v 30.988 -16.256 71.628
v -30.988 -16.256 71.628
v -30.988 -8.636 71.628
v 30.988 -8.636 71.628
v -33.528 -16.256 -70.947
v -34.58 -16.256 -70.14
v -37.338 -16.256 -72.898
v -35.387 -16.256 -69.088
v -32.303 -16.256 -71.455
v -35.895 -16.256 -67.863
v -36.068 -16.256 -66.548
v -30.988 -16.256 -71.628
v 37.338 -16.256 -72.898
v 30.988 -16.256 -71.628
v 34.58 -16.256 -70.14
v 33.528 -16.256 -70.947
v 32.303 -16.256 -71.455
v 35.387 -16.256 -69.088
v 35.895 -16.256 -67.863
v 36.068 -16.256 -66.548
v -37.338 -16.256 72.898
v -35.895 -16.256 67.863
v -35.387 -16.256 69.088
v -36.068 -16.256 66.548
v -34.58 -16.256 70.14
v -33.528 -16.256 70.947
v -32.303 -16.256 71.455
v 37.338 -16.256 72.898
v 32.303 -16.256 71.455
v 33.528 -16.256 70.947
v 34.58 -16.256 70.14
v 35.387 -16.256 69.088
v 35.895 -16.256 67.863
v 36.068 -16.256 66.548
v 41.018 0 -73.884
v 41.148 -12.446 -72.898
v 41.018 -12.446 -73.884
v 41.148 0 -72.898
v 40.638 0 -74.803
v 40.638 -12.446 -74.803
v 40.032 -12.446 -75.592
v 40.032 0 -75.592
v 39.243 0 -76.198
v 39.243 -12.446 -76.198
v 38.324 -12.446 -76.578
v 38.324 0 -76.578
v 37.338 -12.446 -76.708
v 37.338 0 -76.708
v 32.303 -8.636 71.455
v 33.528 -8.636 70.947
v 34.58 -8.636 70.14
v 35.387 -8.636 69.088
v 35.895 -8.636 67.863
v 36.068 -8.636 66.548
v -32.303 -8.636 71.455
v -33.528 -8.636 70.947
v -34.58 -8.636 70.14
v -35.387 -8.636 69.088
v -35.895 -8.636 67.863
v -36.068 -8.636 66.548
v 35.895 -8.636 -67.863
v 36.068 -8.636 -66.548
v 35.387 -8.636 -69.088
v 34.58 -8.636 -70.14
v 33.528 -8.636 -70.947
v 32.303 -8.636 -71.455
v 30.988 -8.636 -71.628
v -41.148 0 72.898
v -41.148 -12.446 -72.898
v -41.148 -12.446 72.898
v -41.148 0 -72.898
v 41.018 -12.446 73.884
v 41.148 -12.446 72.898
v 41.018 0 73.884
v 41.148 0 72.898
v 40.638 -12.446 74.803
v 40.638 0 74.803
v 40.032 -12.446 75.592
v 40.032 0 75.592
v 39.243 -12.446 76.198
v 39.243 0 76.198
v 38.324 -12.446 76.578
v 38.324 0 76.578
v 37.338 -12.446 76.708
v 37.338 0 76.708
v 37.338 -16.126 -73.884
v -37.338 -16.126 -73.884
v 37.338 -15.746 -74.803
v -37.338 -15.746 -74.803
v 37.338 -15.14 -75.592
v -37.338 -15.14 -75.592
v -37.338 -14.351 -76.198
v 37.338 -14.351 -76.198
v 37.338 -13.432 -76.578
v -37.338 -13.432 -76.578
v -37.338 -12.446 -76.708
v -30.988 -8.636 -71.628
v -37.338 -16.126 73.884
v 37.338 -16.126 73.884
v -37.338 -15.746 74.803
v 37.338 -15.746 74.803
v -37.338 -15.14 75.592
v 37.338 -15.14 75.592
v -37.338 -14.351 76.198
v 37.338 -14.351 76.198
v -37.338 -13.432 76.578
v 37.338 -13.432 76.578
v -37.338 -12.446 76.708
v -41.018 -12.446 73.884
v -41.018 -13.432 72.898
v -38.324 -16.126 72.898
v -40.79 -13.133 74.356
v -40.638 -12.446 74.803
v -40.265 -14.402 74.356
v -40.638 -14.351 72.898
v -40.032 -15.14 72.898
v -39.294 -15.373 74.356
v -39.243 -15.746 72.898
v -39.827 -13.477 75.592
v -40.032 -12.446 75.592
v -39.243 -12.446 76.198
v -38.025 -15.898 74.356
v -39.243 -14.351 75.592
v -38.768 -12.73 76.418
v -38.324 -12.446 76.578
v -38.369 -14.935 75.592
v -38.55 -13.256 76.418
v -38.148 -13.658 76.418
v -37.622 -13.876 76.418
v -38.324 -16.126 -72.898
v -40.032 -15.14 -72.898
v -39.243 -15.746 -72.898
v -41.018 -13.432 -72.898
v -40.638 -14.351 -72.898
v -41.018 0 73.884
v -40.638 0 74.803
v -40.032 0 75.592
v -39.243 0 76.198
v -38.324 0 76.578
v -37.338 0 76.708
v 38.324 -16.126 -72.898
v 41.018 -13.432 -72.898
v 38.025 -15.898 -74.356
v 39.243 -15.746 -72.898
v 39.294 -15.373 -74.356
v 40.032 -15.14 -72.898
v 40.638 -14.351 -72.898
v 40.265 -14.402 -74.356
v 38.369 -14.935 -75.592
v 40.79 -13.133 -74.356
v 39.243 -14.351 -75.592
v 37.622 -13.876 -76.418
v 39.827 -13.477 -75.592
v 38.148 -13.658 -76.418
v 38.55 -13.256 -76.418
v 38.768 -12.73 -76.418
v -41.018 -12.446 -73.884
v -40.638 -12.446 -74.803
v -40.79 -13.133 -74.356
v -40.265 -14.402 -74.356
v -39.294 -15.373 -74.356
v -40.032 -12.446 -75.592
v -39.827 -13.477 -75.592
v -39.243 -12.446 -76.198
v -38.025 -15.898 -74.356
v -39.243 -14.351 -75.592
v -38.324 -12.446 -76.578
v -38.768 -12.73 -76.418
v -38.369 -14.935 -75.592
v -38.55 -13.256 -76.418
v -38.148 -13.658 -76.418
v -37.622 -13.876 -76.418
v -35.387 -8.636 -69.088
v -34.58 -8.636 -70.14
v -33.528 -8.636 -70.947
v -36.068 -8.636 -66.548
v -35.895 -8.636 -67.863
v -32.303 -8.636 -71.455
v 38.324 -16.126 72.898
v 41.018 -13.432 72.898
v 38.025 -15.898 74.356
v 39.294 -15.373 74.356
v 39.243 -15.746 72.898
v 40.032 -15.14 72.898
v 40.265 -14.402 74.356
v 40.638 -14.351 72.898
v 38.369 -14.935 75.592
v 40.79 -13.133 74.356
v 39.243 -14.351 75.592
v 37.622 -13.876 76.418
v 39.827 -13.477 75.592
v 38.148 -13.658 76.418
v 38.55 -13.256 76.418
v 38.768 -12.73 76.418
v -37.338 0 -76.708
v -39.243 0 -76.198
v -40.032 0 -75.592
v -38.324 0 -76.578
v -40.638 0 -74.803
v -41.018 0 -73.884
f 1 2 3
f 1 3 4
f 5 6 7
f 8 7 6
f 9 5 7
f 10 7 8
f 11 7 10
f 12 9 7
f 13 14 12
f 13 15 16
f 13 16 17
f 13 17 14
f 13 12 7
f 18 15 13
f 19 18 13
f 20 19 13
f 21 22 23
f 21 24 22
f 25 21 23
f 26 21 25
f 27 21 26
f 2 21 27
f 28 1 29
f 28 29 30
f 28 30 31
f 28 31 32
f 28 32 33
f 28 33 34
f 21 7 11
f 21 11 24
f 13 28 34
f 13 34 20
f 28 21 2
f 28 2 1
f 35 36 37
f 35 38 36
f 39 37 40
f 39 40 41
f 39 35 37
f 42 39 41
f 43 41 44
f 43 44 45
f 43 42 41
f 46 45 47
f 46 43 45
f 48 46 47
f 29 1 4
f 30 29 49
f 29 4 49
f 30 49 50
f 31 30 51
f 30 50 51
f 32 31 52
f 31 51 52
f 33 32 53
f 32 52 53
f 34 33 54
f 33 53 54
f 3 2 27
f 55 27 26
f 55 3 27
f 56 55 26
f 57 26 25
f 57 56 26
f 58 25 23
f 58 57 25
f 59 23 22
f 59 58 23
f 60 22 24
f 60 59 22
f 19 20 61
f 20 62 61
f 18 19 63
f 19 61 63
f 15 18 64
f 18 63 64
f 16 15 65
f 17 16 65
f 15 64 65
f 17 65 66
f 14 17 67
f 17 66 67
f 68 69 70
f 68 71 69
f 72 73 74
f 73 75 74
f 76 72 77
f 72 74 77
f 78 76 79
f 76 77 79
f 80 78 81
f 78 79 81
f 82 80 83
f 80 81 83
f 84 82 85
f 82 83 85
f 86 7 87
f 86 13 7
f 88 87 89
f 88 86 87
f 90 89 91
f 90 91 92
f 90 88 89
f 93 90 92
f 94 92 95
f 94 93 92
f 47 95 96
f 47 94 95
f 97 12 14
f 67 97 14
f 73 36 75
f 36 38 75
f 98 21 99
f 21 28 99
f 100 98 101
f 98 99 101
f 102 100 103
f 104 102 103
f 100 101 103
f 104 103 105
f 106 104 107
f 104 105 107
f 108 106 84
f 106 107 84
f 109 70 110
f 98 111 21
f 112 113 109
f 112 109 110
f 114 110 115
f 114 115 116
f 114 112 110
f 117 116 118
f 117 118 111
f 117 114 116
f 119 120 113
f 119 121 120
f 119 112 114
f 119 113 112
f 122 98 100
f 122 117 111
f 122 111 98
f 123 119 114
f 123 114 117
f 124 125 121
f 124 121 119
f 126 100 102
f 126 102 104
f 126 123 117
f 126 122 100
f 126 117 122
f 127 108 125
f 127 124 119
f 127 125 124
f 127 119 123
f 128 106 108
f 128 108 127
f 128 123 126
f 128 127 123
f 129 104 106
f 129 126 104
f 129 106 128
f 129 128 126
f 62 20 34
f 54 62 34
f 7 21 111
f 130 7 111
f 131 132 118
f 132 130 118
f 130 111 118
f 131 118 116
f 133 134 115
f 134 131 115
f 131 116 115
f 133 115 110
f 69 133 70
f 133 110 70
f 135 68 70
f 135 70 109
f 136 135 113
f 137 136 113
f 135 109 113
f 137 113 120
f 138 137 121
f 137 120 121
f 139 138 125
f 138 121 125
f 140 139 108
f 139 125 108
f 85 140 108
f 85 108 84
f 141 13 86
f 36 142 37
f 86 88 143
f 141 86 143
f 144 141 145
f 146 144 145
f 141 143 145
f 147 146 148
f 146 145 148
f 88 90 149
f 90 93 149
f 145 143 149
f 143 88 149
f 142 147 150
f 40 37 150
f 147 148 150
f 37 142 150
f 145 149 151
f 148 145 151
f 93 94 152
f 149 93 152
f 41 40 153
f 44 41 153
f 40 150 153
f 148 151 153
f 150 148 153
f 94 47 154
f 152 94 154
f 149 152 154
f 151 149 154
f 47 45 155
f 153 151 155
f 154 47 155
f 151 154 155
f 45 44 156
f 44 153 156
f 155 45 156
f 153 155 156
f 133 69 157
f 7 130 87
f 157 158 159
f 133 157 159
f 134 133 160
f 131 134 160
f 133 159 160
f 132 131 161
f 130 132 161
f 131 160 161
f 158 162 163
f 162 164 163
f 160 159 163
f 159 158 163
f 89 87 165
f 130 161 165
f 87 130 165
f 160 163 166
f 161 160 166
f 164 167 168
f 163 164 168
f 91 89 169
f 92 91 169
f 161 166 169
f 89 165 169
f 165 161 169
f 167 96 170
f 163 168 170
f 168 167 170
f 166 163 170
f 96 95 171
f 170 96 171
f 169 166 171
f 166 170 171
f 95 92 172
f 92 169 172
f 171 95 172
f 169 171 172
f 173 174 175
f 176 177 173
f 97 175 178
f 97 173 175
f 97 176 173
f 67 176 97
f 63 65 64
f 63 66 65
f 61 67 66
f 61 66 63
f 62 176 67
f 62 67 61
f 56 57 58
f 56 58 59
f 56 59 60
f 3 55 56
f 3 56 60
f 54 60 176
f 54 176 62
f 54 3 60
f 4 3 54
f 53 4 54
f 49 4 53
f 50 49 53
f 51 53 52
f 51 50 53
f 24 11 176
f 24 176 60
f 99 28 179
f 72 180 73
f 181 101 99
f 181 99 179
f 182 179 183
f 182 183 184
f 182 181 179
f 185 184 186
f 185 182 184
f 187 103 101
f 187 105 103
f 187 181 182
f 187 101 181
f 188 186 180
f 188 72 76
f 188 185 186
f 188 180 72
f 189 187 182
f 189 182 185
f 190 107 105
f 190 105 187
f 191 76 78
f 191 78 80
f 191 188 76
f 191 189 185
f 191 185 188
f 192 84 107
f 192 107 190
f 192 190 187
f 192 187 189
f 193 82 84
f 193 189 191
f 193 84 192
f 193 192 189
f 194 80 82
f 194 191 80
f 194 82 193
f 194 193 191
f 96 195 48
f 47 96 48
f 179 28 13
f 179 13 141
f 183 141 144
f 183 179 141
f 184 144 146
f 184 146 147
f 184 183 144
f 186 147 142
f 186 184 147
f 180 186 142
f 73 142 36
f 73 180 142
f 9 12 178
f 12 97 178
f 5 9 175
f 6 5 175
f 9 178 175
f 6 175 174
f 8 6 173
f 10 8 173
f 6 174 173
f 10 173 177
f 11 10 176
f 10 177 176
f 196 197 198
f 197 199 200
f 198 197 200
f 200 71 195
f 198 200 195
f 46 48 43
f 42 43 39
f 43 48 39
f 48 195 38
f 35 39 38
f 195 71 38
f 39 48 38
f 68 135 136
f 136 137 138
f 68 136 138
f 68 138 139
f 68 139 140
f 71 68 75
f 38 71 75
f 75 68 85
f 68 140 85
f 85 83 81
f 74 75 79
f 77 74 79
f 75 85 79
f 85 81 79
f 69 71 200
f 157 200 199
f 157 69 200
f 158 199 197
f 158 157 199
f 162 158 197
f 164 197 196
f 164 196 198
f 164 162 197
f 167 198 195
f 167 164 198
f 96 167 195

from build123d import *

# Parameters (mm, degrees)
F0_W     = 82.296
F0_H     = 153.416
F1_DEPTH = 16.256
F2_W     = 72.136
F2_H     = 143.256
F3_DEPTH = 7.62
F4_R     = 5.08
F5_R     = 5.08
F6_R     = 5.08
F7_R     = 5.08
F8_R     = 3.81
F9_R     = 3.81


with BuildPart() as f1:
    # F0 (on Front) → F1 (new body)
    with BuildSketch(Plane.XZ):
        Rectangle(F0_W, F0_H)
    extrude(amount=F1_DEPTH)

    # F2 (on face) → F3 (cut)
    with BuildSketch(Plane.XZ.offset(16.256)):
        Rectangle(F2_W, F2_H)
    extrude(amount=-F3_DEPTH, mode=Mode.SUBTRACT)

    # F4
    f4_edges = [f1.edges().sort_by_distance(p)[0] for p in [
        (-36.068, -12.446, 71.628),
    ]]
    fillet(f4_edges, radius=F4_R)

    # F5
    f5_edges = [f1.edges().sort_by_distance(p)[0] for p in [
        (36.068, -12.446, 71.628),
    ]]
    fillet(f5_edges, radius=F5_R)

    # F6
    f6_edges = [f1.edges().sort_by_distance(p)[0] for p in [
        (36.068, -12.446, -71.628),
    ]]
    fillet(f6_edges, radius=F6_R)

    # F7
    f7_edges = [f1.edges().sort_by_distance(p)[0] for p in [
        (-36.068, -12.446, -71.628),
    ]]
    fillet(f7_edges, radius=F7_R)

    # F8
    f8_edges = [f1.edges().sort_by_distance(p)[0] for p in [
        (41.148, -16.256, 0),
        (-41.148, -16.256, 0),
    ]]
    fillet(f8_edges, radius=F8_R)

    # F9
    f9_edges = [f1.edges().sort_by_distance(p)[0] for p in [
        (0, -16.256, 76.708),
        (0, -16.256, -76.708),
    ]]
    fillet(f9_edges, radius=F9_R)


solid = f1.part
